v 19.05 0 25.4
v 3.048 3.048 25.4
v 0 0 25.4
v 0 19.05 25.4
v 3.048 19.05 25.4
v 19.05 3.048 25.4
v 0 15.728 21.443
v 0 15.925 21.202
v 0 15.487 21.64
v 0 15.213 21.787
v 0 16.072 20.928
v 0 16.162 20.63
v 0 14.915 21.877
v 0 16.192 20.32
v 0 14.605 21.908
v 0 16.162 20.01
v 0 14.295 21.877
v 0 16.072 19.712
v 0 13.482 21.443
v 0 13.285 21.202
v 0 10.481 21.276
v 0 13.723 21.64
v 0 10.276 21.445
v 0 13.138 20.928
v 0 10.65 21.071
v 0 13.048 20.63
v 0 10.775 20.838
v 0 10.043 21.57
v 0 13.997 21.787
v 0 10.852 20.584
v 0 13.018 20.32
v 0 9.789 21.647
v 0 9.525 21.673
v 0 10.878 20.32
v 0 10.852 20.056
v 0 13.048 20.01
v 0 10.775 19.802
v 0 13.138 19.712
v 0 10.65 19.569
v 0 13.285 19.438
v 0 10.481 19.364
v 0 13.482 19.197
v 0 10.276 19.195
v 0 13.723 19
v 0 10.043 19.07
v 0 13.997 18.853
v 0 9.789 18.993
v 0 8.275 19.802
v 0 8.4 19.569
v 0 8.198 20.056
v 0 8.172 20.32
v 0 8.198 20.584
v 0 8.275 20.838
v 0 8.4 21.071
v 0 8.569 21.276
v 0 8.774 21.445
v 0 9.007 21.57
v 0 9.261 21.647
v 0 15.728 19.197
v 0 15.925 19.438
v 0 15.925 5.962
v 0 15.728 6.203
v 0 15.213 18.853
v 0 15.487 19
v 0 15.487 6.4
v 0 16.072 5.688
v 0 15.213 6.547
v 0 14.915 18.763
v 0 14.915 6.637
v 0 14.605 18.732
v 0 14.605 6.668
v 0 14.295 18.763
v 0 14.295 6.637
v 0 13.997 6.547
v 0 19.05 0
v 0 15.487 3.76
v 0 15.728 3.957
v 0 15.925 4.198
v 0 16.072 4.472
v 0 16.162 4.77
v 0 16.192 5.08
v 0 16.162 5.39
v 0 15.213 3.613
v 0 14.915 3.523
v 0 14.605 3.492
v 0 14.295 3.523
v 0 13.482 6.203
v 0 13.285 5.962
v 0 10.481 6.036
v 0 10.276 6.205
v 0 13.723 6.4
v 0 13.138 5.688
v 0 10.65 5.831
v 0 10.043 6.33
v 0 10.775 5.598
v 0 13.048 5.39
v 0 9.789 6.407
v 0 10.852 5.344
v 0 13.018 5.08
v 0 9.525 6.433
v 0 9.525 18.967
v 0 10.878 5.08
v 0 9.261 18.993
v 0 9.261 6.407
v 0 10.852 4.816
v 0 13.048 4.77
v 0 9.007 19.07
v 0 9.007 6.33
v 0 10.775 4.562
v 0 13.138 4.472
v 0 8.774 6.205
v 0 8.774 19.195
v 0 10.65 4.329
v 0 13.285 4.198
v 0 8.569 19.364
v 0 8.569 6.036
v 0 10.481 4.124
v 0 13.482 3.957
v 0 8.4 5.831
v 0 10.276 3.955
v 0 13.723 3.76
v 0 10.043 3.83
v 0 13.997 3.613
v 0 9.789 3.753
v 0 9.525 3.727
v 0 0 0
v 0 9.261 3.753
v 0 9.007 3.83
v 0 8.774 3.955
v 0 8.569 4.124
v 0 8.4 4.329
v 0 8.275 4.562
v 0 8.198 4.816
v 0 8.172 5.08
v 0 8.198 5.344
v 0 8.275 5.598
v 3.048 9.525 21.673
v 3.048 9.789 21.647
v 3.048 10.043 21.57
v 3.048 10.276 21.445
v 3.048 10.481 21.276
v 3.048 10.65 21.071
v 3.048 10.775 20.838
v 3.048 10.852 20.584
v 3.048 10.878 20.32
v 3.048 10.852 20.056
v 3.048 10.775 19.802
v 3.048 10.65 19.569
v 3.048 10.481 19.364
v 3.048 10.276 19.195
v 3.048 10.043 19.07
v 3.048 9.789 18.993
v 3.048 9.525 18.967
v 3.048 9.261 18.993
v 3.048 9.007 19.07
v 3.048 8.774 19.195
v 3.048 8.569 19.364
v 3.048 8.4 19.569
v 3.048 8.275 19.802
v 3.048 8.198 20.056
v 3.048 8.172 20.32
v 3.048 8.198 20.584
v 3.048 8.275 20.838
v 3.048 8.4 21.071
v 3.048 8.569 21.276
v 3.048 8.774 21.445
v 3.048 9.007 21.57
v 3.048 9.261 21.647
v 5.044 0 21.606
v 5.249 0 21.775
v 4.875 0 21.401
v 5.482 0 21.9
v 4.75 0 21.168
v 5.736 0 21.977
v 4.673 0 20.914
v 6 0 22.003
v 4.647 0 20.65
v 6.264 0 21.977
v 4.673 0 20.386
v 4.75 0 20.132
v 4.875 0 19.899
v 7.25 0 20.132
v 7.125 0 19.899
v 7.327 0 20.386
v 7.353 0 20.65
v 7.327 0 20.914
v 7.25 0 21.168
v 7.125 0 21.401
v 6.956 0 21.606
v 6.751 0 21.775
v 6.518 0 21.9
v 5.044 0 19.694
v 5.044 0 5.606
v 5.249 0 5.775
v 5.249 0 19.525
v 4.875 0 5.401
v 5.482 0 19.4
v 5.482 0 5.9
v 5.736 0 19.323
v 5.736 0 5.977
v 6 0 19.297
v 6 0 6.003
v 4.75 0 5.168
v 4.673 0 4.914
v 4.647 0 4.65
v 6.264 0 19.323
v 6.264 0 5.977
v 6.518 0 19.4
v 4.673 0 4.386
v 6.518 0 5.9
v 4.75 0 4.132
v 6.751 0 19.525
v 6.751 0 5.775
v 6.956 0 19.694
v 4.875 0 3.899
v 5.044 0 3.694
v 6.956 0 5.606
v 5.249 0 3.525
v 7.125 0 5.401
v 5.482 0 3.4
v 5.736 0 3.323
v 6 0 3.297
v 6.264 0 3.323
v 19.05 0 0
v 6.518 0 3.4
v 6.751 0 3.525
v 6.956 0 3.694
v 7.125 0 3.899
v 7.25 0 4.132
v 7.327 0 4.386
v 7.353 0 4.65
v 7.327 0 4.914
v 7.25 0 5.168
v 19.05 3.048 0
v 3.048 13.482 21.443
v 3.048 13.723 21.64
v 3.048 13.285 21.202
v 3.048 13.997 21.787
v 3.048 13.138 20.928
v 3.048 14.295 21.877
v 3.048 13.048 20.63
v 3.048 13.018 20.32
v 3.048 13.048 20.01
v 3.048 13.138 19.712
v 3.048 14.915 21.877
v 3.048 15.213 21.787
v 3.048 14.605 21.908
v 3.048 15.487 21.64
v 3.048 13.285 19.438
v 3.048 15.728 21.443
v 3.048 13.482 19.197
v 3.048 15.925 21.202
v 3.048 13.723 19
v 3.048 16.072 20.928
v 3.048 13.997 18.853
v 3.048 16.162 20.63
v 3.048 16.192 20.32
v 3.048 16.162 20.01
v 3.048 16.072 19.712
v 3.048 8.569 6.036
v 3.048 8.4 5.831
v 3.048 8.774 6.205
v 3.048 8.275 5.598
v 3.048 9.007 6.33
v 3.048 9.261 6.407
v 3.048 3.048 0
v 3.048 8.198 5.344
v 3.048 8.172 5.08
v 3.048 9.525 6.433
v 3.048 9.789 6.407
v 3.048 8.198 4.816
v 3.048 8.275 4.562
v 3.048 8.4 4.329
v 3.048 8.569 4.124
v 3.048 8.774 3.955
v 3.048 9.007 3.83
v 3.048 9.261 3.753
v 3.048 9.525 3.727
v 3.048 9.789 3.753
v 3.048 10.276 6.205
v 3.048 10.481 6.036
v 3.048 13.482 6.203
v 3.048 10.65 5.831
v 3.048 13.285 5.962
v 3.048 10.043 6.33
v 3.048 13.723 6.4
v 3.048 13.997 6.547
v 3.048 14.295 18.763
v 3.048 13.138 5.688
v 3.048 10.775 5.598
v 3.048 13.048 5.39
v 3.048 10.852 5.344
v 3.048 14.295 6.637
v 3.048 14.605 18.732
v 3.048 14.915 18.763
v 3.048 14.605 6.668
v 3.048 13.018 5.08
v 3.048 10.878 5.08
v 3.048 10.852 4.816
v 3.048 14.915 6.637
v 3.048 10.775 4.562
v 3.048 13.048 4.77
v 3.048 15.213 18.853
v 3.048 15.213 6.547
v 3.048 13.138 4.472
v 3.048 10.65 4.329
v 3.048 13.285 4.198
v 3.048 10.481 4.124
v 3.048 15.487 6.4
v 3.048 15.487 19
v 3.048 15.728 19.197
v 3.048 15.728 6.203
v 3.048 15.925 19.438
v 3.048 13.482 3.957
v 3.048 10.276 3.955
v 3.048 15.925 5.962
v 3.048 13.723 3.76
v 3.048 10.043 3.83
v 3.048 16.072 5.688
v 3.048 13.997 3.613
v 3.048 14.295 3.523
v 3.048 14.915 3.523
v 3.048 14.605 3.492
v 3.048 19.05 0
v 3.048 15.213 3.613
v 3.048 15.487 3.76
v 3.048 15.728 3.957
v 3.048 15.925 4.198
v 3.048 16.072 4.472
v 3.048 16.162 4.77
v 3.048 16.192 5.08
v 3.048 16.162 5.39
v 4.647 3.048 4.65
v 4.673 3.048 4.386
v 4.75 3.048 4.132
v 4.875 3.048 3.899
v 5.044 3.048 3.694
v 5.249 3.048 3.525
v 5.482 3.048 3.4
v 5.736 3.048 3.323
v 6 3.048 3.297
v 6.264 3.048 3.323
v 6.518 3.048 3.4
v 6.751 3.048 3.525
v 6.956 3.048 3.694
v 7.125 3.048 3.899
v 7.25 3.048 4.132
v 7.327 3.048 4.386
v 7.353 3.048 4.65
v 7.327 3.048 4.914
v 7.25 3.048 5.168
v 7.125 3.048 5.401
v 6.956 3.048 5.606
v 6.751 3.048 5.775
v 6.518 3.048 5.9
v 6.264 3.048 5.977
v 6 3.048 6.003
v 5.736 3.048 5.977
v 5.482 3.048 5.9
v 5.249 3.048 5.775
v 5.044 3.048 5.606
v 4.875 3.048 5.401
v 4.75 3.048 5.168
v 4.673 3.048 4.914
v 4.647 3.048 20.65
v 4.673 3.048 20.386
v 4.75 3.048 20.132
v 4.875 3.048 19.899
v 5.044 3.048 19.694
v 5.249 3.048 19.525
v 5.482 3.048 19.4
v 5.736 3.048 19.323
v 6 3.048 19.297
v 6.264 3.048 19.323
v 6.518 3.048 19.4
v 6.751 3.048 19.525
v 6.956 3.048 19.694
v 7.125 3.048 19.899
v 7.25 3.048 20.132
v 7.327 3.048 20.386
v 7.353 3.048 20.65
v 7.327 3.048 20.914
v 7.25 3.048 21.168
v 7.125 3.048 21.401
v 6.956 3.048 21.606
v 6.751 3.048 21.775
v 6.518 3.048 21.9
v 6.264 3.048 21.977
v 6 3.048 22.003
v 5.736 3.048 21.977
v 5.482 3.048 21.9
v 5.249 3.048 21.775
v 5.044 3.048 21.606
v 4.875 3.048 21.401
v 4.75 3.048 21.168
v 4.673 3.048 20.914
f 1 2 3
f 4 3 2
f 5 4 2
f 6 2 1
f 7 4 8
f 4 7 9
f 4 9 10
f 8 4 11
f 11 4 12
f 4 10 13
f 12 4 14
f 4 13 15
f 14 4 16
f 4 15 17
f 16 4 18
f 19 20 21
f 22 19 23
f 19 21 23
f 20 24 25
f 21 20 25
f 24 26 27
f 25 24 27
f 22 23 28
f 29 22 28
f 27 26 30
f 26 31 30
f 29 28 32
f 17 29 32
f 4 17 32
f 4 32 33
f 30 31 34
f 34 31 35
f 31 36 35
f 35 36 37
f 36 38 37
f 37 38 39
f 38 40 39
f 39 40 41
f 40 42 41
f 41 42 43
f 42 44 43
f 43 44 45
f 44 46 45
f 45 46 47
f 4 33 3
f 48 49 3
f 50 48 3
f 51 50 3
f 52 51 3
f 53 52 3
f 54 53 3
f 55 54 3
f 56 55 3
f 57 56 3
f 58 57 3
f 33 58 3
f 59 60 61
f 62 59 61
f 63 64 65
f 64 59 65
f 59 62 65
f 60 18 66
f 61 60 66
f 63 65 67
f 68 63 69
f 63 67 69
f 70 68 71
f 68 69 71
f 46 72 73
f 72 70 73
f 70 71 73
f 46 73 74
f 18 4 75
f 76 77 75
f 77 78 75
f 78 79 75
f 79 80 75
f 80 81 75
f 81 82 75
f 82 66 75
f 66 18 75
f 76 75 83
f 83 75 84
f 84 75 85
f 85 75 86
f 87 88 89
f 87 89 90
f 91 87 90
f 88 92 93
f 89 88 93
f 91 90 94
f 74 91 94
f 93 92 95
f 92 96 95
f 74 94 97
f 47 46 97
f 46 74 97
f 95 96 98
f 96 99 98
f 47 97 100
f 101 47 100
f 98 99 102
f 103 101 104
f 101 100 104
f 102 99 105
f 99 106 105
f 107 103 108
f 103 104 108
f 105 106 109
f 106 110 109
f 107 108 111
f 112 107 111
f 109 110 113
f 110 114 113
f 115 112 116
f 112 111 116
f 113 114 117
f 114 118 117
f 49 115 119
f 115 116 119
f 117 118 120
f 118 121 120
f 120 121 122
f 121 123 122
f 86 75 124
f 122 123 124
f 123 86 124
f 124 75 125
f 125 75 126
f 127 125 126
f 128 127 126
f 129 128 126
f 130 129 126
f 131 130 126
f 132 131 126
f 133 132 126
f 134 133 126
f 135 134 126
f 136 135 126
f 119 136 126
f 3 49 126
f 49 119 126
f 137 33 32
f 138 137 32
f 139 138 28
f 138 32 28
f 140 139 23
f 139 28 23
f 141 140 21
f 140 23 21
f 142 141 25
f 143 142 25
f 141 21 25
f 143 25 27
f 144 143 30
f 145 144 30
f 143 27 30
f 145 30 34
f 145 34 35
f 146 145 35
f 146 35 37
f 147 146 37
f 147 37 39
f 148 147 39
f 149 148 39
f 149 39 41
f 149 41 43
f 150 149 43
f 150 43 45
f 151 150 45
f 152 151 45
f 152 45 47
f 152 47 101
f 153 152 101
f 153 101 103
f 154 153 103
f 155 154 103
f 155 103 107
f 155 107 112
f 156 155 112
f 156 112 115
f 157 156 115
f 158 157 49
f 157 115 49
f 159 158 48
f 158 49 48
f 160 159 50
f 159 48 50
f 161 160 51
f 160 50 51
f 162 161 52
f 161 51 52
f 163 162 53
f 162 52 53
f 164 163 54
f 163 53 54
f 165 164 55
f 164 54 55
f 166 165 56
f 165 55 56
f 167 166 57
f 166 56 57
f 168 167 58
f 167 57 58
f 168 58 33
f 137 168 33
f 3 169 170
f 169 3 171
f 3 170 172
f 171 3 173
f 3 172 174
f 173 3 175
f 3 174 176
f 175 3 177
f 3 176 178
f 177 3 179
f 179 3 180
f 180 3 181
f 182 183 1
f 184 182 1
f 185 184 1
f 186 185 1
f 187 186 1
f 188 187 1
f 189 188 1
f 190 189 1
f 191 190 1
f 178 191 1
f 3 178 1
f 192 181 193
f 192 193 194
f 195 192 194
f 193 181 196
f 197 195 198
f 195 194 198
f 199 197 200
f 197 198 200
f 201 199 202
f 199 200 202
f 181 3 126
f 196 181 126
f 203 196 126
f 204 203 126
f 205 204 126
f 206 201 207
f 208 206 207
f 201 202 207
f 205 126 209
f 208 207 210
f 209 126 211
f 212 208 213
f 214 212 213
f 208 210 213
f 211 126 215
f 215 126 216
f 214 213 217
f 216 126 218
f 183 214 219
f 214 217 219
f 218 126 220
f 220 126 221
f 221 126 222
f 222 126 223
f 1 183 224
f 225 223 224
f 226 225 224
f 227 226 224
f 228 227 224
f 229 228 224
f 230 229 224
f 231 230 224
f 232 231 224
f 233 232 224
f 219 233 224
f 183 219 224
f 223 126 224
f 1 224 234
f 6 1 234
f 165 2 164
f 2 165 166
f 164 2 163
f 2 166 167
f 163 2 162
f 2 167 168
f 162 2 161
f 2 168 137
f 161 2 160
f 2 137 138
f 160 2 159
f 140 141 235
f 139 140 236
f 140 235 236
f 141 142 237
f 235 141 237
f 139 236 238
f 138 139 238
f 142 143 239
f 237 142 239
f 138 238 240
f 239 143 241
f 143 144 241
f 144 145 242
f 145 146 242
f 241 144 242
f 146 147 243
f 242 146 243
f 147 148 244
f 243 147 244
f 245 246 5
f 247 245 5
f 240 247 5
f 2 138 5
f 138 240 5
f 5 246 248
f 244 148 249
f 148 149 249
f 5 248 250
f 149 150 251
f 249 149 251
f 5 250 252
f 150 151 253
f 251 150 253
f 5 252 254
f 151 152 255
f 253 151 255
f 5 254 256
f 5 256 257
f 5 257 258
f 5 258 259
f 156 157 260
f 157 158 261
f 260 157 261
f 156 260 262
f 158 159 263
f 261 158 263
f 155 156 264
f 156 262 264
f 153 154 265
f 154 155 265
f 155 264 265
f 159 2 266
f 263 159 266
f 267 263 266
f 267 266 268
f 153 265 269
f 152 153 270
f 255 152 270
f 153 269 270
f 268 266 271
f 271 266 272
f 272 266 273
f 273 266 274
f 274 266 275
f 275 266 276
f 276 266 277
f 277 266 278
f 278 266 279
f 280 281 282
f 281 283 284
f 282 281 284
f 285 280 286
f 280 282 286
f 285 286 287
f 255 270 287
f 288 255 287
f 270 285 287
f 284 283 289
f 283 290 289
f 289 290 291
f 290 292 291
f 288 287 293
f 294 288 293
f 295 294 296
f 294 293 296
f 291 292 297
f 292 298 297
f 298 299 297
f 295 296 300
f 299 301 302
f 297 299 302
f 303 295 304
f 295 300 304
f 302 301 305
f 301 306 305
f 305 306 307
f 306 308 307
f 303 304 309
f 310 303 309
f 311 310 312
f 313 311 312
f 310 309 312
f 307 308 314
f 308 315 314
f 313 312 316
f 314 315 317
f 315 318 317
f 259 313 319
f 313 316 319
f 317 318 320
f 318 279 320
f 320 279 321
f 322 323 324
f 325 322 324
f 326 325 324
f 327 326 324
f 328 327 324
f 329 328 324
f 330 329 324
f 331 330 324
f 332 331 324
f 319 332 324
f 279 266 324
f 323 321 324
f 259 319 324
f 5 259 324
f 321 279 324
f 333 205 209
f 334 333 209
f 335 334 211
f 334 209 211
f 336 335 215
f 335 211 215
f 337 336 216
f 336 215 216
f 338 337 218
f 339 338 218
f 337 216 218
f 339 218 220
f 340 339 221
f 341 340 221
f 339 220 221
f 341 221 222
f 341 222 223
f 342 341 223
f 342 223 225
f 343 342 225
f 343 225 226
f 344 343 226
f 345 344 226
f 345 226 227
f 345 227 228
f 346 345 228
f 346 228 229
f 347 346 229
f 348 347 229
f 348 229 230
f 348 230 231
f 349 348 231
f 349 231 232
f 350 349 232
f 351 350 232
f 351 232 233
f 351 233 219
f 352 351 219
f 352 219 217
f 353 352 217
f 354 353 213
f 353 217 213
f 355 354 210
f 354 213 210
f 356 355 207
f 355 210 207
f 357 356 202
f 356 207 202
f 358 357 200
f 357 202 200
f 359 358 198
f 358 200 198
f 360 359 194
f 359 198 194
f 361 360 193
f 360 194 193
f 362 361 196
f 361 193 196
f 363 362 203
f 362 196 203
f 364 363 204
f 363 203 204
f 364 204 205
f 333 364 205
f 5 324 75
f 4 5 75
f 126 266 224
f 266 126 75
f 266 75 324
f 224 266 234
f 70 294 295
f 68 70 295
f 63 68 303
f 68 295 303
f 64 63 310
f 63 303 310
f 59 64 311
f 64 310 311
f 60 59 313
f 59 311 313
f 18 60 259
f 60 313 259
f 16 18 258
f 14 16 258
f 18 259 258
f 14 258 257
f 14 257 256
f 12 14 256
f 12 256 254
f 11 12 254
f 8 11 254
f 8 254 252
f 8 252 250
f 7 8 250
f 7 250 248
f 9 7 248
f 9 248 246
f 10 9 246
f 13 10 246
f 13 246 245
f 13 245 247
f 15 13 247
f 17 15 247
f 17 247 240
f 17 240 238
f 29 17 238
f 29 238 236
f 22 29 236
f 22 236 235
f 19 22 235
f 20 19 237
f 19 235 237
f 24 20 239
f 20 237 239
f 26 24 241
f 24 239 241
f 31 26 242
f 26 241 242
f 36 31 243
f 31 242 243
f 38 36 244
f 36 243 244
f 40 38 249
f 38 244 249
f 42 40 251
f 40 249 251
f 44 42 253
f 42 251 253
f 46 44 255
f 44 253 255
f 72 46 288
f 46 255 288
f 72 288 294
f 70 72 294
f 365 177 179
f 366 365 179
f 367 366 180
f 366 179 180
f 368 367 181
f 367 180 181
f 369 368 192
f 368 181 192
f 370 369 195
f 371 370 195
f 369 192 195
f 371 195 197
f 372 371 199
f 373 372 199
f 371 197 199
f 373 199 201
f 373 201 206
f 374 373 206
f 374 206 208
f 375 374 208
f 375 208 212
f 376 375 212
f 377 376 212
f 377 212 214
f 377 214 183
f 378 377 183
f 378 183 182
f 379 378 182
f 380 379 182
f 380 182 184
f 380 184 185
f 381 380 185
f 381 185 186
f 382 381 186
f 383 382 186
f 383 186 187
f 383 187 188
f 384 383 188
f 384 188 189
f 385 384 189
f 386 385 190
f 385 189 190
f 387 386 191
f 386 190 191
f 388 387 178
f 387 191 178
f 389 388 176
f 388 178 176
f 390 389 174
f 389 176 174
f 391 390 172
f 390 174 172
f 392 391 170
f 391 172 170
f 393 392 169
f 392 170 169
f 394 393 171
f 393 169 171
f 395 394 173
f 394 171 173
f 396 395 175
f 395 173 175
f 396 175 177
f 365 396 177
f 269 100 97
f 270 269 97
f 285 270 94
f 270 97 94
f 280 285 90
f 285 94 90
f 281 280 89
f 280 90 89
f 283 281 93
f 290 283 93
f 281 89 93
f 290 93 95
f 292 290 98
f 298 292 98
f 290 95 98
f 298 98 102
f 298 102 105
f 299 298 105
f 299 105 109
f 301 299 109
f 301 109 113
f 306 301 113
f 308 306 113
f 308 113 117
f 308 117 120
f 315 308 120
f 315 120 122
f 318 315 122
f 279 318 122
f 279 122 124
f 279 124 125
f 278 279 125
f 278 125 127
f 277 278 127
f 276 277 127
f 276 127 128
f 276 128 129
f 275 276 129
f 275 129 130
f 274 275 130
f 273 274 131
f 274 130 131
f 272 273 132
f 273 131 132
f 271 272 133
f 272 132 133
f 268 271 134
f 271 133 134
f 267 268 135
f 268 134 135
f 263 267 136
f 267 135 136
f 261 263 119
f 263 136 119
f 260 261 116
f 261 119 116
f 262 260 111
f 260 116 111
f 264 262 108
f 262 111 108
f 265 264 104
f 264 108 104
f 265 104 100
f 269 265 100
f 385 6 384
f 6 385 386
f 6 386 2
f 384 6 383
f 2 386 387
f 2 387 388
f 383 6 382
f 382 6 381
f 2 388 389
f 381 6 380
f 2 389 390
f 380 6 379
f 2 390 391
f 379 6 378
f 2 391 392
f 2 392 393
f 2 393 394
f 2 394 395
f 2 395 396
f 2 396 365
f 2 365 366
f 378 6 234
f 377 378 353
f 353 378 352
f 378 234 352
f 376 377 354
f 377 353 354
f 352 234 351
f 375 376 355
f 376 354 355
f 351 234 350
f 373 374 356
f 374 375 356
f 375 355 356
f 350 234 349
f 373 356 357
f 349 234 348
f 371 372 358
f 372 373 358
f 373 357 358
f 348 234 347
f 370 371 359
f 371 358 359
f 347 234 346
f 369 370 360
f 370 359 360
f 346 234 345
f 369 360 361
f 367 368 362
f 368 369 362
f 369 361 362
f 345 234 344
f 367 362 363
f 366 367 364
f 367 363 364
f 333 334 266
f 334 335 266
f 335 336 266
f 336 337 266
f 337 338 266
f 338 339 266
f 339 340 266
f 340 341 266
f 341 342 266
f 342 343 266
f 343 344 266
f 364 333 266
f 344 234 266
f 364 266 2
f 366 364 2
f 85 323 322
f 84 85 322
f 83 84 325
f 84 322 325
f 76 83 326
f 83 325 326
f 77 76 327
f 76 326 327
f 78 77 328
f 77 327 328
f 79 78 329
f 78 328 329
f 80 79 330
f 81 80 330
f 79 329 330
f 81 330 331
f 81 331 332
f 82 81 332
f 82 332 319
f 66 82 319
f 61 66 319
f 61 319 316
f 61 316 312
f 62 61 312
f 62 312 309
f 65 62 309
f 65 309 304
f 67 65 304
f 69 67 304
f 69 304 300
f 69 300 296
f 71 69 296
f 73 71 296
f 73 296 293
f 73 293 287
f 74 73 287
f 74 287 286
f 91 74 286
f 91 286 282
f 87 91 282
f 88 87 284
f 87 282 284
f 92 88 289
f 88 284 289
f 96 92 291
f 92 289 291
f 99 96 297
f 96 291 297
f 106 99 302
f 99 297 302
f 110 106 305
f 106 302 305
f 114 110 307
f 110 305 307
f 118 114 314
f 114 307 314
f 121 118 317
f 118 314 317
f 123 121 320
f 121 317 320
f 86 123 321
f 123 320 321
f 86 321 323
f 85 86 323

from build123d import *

# Parameters (mm, degrees)
BOSS_EXTRUDE1_DEPTH   = 25.4
F_6_32_TAPPED_HOLE1_D = 2.7051
F_6_32_TAPPED_HOLE2_D = 2.7051
SKETCH7_R             = 1.5875
CUT_EXTRUDE1_DEPTH    = 4.048


with BuildPart() as part:
    # Sketch1 → Boss-Extrude1 (new body)
    with BuildSketch(Plane.XY):
        Polygon((0, 0), (19.05, 0), (19.05, 3.048), (3.048, 3.048), (3.048, 19.05), (0, 19.05), align=None)
    extrude(amount=BOSS_EXTRUDE1_DEPTH)

    # #6-32 Tapped Hole1 (through all)
    with Locations(Plane(origin=(3.048, 0, 0), x_dir=(0, 0, -1), z_dir=(1, 0, 0))):
        with Locations((-20.32, 9.525), (-5.08, 9.525)):
            Hole(F_6_32_TAPPED_HOLE1_D / 2)

    # #6-32 Tapped Hole2 (through all)
    with Locations(Plane(origin=(0, 3.048, 0), x_dir=(1, 0, 0), z_dir=(0, 1, 0))):
        with Locations((6, -20.65), (6, -4.65)):
            Hole(F_6_32_TAPPED_HOLE2_D / 2)

    # Sketch7 → Cut-Extrude1 (cut, through all)
    with BuildSketch(Plane(origin=(3.048, 0, 0), x_dir=(0, 0, -1), z_dir=(1, 0, 0))):
        with Locations((-20.32, 14.605)):
            Circle(SKETCH7_R)
        with Locations((-5.08, 14.605)):
            Circle(SKETCH7_R)
    extrude(amount=-CUT_EXTRUDE1_DEPTH, mode=Mode.SUBTRACT)


solid = part.part
